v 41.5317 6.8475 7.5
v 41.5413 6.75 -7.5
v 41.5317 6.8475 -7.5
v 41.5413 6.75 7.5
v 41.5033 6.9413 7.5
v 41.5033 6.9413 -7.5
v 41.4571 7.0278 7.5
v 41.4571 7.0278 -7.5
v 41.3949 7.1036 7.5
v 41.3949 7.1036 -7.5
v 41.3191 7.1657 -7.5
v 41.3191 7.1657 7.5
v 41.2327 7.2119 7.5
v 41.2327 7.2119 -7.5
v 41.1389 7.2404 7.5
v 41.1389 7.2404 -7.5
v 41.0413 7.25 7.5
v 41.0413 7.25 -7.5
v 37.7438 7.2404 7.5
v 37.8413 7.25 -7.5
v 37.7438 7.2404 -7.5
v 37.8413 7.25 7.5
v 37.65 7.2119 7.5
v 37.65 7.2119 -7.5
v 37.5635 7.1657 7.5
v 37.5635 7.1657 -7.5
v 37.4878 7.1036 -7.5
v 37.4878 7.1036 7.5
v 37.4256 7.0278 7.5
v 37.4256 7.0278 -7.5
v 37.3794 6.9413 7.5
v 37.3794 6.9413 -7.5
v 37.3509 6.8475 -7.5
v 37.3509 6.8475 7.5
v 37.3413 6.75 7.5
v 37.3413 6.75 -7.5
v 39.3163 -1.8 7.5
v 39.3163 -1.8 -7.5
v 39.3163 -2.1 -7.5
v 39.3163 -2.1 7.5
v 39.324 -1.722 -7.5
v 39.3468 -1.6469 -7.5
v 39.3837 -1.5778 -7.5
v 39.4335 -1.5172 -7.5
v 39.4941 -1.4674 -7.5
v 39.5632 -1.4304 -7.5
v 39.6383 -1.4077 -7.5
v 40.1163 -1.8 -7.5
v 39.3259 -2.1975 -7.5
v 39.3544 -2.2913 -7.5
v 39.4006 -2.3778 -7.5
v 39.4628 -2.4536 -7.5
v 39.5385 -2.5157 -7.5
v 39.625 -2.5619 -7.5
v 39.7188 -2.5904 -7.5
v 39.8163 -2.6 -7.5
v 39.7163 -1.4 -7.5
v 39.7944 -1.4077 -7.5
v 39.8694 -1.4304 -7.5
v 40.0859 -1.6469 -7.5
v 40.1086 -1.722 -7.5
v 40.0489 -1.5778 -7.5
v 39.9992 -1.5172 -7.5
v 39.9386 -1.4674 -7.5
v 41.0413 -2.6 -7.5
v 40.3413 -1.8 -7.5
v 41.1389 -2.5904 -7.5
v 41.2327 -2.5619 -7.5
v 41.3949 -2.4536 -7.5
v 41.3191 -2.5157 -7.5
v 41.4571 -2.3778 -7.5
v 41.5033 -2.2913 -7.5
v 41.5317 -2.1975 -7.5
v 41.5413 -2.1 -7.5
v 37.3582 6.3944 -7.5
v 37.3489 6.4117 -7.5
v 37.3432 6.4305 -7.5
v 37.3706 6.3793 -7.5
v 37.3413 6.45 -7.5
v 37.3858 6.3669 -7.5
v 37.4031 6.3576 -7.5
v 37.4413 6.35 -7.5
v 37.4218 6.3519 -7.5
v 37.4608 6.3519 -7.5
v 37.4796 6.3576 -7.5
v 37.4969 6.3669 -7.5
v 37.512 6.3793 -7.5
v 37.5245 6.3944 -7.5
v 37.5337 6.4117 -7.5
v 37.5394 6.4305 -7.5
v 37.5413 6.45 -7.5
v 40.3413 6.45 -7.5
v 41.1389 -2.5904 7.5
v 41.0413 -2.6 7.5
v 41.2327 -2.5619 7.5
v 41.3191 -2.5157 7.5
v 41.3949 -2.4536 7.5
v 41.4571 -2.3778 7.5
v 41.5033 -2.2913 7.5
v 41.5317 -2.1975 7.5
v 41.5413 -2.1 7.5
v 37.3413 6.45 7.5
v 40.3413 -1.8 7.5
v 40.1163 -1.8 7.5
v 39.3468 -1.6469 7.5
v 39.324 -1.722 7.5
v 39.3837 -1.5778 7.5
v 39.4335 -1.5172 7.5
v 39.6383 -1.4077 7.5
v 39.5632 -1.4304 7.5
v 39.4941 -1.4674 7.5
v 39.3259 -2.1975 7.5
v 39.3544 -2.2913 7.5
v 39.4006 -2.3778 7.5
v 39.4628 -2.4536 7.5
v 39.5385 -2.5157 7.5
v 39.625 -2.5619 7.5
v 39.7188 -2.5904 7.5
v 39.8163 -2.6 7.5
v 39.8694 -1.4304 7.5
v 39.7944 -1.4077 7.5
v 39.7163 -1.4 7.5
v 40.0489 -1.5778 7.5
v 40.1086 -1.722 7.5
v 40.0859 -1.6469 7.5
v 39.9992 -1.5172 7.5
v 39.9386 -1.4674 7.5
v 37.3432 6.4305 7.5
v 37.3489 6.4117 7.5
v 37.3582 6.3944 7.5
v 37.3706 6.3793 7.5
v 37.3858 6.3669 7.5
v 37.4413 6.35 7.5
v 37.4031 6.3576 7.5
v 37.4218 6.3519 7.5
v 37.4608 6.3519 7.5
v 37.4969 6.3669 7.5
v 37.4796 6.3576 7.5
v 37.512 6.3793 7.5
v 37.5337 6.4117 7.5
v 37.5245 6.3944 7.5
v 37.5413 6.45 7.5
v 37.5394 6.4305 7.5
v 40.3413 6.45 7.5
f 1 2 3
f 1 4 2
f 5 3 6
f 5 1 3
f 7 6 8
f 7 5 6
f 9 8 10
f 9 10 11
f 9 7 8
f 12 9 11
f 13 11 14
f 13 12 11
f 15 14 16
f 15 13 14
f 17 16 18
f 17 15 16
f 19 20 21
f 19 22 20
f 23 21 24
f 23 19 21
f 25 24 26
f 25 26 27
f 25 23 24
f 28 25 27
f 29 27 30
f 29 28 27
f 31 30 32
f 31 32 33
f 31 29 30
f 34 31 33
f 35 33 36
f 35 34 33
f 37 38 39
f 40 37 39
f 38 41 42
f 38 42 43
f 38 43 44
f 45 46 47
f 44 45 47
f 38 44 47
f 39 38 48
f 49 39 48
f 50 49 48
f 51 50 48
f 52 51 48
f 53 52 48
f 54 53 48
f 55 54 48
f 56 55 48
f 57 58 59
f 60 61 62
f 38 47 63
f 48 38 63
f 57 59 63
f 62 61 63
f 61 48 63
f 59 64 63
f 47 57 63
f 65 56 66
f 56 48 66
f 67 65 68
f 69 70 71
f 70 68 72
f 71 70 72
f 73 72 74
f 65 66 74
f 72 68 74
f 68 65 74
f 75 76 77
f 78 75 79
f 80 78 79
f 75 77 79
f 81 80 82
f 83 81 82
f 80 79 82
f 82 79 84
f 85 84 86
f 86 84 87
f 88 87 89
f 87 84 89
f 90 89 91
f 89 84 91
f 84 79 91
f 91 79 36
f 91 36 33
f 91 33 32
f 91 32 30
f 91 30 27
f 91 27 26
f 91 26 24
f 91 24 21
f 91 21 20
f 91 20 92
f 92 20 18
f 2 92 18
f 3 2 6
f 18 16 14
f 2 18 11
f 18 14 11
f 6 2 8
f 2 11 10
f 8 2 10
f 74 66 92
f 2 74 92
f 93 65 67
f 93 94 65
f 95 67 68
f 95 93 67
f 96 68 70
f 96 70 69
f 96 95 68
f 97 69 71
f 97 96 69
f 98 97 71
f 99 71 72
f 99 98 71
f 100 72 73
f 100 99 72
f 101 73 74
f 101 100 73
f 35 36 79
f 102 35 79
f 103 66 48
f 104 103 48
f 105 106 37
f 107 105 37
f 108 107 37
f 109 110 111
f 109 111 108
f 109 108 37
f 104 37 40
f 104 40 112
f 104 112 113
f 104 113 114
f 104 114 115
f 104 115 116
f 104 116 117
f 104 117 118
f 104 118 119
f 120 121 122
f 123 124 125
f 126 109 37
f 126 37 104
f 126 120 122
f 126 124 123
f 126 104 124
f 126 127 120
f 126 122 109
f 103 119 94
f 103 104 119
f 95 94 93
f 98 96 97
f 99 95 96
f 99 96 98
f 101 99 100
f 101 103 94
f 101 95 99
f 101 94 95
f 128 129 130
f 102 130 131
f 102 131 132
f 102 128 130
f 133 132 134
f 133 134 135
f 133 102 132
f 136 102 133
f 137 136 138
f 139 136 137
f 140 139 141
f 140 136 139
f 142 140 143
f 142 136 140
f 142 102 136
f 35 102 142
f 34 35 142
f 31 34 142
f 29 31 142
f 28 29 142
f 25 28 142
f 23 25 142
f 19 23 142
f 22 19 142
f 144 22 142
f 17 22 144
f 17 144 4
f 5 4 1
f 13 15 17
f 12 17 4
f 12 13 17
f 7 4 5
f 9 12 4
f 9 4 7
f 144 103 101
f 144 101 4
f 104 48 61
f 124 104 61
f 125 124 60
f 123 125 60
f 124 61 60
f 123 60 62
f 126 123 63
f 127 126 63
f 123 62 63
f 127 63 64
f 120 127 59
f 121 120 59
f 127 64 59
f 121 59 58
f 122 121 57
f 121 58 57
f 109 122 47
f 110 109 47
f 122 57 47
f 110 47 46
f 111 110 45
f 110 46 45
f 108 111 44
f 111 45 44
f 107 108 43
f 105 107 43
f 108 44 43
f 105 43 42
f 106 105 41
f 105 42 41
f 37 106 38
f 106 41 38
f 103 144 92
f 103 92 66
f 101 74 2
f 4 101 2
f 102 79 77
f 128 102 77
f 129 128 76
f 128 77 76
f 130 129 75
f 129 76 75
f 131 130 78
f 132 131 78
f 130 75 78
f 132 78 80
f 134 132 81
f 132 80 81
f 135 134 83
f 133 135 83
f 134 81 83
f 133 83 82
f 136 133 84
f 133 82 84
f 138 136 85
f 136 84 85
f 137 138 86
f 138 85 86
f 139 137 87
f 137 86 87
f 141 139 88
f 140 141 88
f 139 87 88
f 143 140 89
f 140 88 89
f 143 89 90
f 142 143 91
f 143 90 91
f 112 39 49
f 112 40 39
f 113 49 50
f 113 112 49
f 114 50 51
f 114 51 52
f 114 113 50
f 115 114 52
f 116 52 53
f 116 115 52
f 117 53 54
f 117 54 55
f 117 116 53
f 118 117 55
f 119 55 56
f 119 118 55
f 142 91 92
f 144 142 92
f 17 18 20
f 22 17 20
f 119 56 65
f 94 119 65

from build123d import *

# Parameters (mm, degrees)
BOSS_EXTRUDE1_DEPTH      = 7.5
BOSS_EXTRUDE1_DEPTH_BACK = 7.5
FILLET1_R                = 0.5


with BuildPart() as part:
    # Sketch2 → Boss-Extrude1 (new, two sides: drawn at the far end of the back side and taken through both)
    with BuildSketch(Plane.XY.offset(-BOSS_EXTRUDE1_DEPTH_BACK)):
        with BuildLine():
            Line((41.541321959, 7.25), (37.341321959, 7.25))
            Line((37.341321959, 7.25), (37.341321959, 6.45))
            ThreePointArc((37.341321959, 6.45), (37.441321959, 6.35), (37.541321959, 6.45))
            Line((37.541321959, 6.45), (40.341321959, 6.45))
            Line((40.341321959, 6.45), (40.341321959, -1.8))
            Line((40.341321959, -1.8), (40.116321959, -1.8))
            ThreePointArc((40.116321959, -1.8), (39.716321959, -1.4), (39.316321959, -1.8))
            Line((39.316321959, -1.8), (39.316321959, -2.6))
            Line((39.316321959, -2.6), (41.541321959, -2.6))
            Line((41.541321959, -2.6), (41.541321959, 7.25))
        make_face()
    extrude(amount=BOSS_EXTRUDE1_DEPTH + BOSS_EXTRUDE1_DEPTH_BACK)

    # Fillet1
    fillet1_edges = [part.edges().sort_by_distance(p)[0] for p in [
        (37.341321959, 7.25, 0),
        (39.316321959, -2.6, 0),
        (41.541321959, -2.6, 0),
        (41.541321959, 7.25, 0),
    ]]
    fillet(fillet1_edges, radius=FILLET1_R)


solid = part.part
